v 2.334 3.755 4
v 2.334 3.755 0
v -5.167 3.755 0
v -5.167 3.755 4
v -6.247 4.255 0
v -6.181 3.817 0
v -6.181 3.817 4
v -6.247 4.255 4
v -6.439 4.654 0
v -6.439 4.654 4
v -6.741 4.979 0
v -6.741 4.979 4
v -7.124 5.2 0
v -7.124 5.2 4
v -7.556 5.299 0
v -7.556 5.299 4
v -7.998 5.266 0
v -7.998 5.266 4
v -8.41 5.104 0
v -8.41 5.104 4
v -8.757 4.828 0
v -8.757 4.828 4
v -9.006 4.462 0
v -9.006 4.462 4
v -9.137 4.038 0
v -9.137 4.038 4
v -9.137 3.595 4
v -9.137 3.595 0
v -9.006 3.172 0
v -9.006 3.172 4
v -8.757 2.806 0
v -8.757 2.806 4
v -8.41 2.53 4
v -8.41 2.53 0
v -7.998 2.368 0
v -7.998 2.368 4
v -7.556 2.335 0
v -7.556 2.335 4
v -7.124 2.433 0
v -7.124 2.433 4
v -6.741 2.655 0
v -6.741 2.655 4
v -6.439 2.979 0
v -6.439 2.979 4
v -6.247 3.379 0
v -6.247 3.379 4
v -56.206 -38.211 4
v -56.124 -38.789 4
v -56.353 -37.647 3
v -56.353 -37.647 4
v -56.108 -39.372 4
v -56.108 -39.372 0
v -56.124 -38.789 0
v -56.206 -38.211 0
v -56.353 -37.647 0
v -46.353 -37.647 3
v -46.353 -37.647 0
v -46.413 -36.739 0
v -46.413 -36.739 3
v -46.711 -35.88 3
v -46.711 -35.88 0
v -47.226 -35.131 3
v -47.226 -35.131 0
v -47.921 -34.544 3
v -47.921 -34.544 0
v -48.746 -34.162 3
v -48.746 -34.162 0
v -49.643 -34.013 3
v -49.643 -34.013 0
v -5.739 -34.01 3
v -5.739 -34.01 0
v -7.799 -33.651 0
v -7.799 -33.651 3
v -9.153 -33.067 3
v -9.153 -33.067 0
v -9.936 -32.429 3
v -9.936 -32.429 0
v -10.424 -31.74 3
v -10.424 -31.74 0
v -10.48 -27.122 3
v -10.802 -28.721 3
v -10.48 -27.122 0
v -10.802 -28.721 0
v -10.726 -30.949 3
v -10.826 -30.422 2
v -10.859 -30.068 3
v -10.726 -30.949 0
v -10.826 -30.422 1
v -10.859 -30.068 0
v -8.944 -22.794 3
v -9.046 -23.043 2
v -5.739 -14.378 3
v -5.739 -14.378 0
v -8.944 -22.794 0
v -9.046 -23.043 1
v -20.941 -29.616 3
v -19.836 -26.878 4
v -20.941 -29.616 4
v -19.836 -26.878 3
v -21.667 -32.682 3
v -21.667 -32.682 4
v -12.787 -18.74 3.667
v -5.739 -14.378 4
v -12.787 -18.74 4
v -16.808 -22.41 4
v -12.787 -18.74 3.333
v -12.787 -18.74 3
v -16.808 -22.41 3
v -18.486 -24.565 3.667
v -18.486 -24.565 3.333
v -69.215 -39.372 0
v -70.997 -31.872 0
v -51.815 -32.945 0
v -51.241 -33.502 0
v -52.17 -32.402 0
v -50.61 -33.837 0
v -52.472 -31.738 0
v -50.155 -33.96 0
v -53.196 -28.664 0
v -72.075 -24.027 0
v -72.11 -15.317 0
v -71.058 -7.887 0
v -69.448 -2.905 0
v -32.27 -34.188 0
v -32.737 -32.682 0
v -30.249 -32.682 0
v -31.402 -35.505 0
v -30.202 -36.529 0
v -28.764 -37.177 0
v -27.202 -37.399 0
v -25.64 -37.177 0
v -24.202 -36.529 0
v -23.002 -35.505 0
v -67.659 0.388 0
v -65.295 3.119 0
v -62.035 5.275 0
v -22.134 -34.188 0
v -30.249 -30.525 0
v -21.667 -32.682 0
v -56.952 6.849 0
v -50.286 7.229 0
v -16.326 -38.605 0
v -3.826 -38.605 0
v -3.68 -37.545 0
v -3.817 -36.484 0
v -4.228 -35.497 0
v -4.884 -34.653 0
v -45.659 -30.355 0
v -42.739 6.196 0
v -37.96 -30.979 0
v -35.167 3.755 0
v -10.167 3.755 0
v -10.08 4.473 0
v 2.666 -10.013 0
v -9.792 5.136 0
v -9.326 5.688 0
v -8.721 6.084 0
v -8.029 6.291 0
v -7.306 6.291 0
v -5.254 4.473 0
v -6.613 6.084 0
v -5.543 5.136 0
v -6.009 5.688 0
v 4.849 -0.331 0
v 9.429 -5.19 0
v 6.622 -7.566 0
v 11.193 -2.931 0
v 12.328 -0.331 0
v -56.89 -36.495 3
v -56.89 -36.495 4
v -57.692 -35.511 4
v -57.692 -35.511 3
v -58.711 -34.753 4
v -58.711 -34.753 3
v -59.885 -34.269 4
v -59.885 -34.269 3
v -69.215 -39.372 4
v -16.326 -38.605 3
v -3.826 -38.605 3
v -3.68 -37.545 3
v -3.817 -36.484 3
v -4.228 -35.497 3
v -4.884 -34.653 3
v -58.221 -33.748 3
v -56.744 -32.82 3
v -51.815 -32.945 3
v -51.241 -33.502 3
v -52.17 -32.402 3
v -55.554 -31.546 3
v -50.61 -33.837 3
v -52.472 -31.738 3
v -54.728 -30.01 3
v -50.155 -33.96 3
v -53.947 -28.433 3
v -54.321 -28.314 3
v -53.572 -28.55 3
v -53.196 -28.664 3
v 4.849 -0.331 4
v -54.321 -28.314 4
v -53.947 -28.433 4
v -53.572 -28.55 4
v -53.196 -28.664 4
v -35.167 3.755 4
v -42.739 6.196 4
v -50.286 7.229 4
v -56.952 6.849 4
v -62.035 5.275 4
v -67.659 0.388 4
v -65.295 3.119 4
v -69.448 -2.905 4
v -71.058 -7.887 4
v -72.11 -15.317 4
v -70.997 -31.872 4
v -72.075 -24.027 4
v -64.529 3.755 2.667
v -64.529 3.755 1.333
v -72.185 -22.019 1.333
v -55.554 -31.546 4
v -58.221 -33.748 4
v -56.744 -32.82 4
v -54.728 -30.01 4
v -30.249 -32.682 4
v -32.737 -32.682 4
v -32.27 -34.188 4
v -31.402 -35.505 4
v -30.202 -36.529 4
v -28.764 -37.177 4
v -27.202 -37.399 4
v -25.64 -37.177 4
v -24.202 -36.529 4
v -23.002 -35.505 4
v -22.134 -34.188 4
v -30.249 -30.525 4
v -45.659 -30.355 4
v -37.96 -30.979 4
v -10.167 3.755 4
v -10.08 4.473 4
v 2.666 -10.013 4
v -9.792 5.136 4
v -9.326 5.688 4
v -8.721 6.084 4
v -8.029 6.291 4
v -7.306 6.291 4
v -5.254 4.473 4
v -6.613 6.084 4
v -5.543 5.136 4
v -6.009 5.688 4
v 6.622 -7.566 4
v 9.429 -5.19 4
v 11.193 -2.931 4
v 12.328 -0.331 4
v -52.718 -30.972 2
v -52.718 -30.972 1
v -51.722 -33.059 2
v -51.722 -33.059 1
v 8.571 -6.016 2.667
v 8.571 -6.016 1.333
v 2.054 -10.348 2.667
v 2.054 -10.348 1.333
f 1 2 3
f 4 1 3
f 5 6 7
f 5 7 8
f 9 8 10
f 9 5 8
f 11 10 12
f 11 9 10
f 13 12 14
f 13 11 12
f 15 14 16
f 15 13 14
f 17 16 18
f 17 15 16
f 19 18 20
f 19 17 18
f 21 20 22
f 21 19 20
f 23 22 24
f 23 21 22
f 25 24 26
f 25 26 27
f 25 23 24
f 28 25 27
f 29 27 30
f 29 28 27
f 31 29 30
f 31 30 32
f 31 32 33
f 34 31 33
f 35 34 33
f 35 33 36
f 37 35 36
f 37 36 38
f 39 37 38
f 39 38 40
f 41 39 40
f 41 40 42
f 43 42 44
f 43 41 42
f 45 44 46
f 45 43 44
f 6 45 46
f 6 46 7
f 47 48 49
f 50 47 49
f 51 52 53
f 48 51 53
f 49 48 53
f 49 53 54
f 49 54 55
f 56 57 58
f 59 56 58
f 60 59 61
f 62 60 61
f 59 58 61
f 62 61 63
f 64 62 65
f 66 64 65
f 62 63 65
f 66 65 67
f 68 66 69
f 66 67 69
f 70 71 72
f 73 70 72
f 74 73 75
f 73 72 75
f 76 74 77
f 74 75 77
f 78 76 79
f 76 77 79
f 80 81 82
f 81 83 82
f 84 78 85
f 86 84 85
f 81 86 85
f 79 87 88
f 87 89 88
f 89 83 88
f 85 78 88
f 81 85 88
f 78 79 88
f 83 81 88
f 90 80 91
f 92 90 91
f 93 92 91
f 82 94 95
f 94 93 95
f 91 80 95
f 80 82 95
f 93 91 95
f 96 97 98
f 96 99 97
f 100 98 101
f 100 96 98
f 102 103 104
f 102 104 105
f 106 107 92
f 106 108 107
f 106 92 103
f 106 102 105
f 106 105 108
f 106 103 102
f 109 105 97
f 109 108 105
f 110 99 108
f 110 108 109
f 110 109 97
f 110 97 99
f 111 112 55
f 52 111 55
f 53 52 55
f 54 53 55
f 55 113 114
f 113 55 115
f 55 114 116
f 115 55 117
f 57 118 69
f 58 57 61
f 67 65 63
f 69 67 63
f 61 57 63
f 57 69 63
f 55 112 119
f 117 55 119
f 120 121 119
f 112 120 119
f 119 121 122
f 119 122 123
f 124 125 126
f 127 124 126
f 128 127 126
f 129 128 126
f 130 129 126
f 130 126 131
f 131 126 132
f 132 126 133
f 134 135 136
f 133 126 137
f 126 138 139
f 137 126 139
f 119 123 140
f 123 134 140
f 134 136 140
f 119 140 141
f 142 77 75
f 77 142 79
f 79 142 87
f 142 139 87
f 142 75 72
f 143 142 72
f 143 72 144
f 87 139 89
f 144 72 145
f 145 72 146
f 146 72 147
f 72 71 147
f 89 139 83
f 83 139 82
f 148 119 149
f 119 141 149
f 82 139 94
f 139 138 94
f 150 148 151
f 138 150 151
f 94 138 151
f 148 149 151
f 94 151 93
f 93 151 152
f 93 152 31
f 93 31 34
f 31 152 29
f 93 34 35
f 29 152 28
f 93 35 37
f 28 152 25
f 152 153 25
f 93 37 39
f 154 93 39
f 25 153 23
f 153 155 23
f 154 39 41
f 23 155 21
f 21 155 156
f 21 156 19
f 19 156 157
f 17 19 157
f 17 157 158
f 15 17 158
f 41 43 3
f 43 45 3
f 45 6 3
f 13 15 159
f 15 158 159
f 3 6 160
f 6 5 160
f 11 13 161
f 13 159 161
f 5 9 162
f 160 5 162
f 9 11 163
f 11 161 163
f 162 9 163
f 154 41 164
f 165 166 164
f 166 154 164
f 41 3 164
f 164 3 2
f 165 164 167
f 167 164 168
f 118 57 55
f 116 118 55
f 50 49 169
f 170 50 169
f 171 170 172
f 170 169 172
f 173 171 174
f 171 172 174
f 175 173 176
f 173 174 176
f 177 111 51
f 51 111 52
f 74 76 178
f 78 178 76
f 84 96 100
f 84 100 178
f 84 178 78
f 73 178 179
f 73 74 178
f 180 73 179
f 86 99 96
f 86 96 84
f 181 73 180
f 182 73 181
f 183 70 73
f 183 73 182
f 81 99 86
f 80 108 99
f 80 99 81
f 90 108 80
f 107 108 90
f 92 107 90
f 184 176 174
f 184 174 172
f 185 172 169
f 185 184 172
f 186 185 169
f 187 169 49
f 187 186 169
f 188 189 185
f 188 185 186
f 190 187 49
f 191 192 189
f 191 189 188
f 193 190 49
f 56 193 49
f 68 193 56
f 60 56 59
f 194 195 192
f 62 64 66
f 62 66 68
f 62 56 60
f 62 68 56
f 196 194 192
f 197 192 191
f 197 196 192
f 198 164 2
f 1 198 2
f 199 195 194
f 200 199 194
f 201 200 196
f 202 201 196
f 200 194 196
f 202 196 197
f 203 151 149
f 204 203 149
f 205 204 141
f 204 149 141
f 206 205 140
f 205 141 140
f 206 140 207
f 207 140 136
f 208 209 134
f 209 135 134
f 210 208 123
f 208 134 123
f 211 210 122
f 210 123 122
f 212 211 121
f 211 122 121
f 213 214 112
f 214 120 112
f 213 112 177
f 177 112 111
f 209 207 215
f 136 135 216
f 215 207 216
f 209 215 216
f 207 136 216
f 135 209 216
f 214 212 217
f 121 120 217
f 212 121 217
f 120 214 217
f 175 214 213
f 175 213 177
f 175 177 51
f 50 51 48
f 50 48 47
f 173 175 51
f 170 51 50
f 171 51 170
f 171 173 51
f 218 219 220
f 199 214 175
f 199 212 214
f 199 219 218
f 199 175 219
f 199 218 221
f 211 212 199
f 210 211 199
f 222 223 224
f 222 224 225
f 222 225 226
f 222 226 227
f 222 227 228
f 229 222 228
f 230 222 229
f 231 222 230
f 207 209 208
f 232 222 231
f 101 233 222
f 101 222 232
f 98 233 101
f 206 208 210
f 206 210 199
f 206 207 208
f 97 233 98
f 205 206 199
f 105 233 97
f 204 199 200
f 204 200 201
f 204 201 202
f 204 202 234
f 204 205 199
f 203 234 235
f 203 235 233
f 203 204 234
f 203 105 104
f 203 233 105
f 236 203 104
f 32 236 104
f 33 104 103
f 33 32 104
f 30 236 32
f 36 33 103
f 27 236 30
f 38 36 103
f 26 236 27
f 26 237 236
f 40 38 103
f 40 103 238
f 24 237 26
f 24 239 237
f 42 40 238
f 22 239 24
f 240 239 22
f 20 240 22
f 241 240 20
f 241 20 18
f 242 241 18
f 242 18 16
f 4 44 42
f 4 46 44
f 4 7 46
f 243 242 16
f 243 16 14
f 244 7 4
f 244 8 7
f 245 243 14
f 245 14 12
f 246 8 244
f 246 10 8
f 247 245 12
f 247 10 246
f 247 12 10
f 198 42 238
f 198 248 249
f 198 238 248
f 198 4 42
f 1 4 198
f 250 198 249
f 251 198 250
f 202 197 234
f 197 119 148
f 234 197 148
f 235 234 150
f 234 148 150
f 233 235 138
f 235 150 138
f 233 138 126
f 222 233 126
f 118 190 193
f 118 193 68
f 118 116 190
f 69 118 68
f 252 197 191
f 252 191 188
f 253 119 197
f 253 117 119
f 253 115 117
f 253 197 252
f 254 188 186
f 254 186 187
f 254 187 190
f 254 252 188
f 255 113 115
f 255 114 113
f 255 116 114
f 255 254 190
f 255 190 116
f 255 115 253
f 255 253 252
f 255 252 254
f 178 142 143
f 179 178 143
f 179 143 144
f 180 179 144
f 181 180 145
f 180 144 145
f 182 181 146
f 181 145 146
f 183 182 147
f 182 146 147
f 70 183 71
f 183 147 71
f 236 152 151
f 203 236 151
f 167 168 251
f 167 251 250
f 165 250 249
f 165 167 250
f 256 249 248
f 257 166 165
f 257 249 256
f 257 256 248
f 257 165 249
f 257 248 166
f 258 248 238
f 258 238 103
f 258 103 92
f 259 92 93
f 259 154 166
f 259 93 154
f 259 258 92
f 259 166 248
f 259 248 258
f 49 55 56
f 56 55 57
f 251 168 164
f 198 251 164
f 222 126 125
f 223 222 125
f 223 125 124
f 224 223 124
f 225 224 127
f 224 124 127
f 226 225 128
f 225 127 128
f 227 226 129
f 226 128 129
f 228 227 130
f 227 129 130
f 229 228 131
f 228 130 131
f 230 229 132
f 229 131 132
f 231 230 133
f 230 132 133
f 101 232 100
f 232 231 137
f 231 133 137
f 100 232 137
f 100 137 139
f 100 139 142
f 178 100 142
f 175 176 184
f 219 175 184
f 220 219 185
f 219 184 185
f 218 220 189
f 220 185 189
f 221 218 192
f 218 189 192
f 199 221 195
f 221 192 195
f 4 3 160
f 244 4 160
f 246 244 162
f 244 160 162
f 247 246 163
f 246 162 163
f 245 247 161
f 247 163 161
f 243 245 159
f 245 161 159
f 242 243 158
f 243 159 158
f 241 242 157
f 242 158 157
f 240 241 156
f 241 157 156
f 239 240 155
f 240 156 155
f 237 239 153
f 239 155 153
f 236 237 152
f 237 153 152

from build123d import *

# Parameters (mm, degrees)
F0_R     = 1.4862523745
F1_DEPTH = 4
F2_DEPTH = 3
F3_DEPTH = 3


with BuildPart() as f1:
    # F0 (on Top) → F1 (new body)
    with BuildSketch(Plane.XY):
        with BuildLine():
            Line((-10.1671746484, 3.7551838017), (-35.1671746484, 3.7551838017))
            add(Edge.make_bspline(
                [(-35.1671746484, 3.7551838017), (-43.7736152968, 7.4979759796), (-70.2851257062, 10.9990665801), (-73.4029060945, -23.2441431133), (-70.7099200787, -33.4466943679), (-69.2152544823, -39.3719944128)],
                knots=[0, 0, 0, 0, 0.3661307892, 0.7164925517, 1, 1, 1, 1], degree=3))
            Line((-69.2152544823, -39.3719944128), (-56.1078186444, -39.3719944128))
            ThreePointArc((-56.1078186444, -39.3719944128), (-56.1569349649, -38.4988373447), (-56.3534555565, -37.6466663903))
            ThreePointArc((-56.3534555565, -37.6466663903), (-57.6917439524, -35.5108484831), (-59.884887178, -34.2687306321))
            ThreePointArc((-59.884887178, -34.2687306321), (-56.1078186444, -32.2211528946), (-54.3214860669, -28.313744902))
            ThreePointArc((-54.3214860669, -28.313744902), (-53.7595727922, -28.491635387), (-53.1957958202, -28.6635280246))
            ThreePointArc((-53.1957958202, -28.6635280246), (-41.8201040172, -30.8016322472), (-30.2485204599, -30.5253938728))
            Line((-30.2485204599, -30.5253938728), (-30.2485204599, -32.681615501))
            Line((-30.2485204599, -32.681615501), (-32.7368205489, -32.681615501))
            ThreePointArc((-32.7368205489, -32.681615501), (-27.2018837, -37.3986096779), (-21.6669468511, -32.681615501))
            add(Edge.make_bspline(
                [(-5.7394118345, -14.3777765672), (-13.0707943254, -18.2833237753), (-20.1352904501, -23.1439779435), (-21.6669468511, -32.681615501)],
                knots=[24.392941426, 24.392941426, 24.392941426, 24.392941426, 46.9272638126, 46.9272638126, 46.9272638126, 46.9272638126], degree=3))
            add(Edge.make_bspline(
                [(12.3276051616, -0.3313678606), (10.4454575301, -7.0415850589), (2.196659222, -10.1501018829), (-5.7394118345, -14.3777765672)],
                knots=[0, 0, 0, 0, 24.392941426, 24.392941426, 24.392941426, 24.392941426], degree=3))
            Line((12.3276051616, -0.3313678606), (4.8488824078, -0.3313678606))
            Line((4.8488824078, -0.3313678606), (2.3340833525, 3.7551838017))
            Line((2.3340833525, 3.7551838017), (-5.1671746484, 3.7551838017))
            ThreePointArc((-5.1671746484, 3.7551838017), (-7.6671746484, 6.3174152001), (-10.1671746484, 3.7551838017))
        make_face()
        with Locations((-7.6671746484, 3.8166594629)):
            Circle(F0_R, mode=Mode.SUBTRACT)
    extrude(amount=F1_DEPTH)

    # F0 (on Top) → F2 (join)
    with BuildSketch(Plane.XY):
        with BuildLine():
            add(Edge.make_bspline(
                [(-5.7394118345, -34.010379664), (-16.0396672151, -33.1520262131), (-8.0283559224, -22.8517708325), (-5.7394118345, -14.3777765672)],
                knots=[0, 0, 0, 0, 19.6326030967, 19.6326030967, 19.6326030967, 19.6326030967], degree=3))
            add(Edge.make_bspline(
                [(-5.7394118345, -14.3777765672), (-13.0707943254, -18.2833237753), (-20.1352904501, -23.1439779435), (-21.6669468511, -32.681615501)],
                knots=[24.392941426, 24.392941426, 24.392941426, 24.392941426, 46.9272638126, 46.9272638126, 46.9272638126, 46.9272638126], degree=3))
            Line((-21.6669468511, -32.681615501), (-16.3262384489, -38.6046262244))
            Line((-16.3262384489, -38.6046262244), (-3.8262384489, -38.6046262244))
            ThreePointArc((-3.8262384489, -38.6046262244), (-3.9894854664, -35.9771340072), (-5.7394118345, -34.010379664))
        make_face()
    extrude(amount=F2_DEPTH)

    # F0 (on Top) → F3 (join)
    with BuildSketch(Plane.XY):
        with BuildLine():
            ThreePointArc((-59.884887178, -34.2687306321), (-57.6917439524, -35.5108484831), (-56.3534555565, -37.6466663903))
            Line((-56.3534555565, -37.6466663903), (-46.3534555565, -37.6466663903))
            ThreePointArc((-46.3534555565, -37.6466663903), (-47.2258595313, -35.1306124978), (-49.6429964265, -34.0129966804))
            add(Edge.make_bspline(
                [(-53.1957958202, -28.6635280246), (-52.7903358749, -30.7805855715), (-52.4500864855, -33.927934333), (-49.6429964265, -34.0129966804)],
                knots=[0, 0, 0, 0, 6.4217753333, 6.4217753333, 6.4217753333, 6.4217753333], degree=3))
            ThreePointArc((-53.1957958202, -28.6635280246), (-53.7595727922, -28.491635387), (-54.3214860669, -28.313744902))
            ThreePointArc((-54.3214860669, -28.313744902), (-56.1078186444, -32.2211528946), (-59.884887178, -34.2687306321))
        make_face()
    extrude(amount=F3_DEPTH)


solid = f1.part
